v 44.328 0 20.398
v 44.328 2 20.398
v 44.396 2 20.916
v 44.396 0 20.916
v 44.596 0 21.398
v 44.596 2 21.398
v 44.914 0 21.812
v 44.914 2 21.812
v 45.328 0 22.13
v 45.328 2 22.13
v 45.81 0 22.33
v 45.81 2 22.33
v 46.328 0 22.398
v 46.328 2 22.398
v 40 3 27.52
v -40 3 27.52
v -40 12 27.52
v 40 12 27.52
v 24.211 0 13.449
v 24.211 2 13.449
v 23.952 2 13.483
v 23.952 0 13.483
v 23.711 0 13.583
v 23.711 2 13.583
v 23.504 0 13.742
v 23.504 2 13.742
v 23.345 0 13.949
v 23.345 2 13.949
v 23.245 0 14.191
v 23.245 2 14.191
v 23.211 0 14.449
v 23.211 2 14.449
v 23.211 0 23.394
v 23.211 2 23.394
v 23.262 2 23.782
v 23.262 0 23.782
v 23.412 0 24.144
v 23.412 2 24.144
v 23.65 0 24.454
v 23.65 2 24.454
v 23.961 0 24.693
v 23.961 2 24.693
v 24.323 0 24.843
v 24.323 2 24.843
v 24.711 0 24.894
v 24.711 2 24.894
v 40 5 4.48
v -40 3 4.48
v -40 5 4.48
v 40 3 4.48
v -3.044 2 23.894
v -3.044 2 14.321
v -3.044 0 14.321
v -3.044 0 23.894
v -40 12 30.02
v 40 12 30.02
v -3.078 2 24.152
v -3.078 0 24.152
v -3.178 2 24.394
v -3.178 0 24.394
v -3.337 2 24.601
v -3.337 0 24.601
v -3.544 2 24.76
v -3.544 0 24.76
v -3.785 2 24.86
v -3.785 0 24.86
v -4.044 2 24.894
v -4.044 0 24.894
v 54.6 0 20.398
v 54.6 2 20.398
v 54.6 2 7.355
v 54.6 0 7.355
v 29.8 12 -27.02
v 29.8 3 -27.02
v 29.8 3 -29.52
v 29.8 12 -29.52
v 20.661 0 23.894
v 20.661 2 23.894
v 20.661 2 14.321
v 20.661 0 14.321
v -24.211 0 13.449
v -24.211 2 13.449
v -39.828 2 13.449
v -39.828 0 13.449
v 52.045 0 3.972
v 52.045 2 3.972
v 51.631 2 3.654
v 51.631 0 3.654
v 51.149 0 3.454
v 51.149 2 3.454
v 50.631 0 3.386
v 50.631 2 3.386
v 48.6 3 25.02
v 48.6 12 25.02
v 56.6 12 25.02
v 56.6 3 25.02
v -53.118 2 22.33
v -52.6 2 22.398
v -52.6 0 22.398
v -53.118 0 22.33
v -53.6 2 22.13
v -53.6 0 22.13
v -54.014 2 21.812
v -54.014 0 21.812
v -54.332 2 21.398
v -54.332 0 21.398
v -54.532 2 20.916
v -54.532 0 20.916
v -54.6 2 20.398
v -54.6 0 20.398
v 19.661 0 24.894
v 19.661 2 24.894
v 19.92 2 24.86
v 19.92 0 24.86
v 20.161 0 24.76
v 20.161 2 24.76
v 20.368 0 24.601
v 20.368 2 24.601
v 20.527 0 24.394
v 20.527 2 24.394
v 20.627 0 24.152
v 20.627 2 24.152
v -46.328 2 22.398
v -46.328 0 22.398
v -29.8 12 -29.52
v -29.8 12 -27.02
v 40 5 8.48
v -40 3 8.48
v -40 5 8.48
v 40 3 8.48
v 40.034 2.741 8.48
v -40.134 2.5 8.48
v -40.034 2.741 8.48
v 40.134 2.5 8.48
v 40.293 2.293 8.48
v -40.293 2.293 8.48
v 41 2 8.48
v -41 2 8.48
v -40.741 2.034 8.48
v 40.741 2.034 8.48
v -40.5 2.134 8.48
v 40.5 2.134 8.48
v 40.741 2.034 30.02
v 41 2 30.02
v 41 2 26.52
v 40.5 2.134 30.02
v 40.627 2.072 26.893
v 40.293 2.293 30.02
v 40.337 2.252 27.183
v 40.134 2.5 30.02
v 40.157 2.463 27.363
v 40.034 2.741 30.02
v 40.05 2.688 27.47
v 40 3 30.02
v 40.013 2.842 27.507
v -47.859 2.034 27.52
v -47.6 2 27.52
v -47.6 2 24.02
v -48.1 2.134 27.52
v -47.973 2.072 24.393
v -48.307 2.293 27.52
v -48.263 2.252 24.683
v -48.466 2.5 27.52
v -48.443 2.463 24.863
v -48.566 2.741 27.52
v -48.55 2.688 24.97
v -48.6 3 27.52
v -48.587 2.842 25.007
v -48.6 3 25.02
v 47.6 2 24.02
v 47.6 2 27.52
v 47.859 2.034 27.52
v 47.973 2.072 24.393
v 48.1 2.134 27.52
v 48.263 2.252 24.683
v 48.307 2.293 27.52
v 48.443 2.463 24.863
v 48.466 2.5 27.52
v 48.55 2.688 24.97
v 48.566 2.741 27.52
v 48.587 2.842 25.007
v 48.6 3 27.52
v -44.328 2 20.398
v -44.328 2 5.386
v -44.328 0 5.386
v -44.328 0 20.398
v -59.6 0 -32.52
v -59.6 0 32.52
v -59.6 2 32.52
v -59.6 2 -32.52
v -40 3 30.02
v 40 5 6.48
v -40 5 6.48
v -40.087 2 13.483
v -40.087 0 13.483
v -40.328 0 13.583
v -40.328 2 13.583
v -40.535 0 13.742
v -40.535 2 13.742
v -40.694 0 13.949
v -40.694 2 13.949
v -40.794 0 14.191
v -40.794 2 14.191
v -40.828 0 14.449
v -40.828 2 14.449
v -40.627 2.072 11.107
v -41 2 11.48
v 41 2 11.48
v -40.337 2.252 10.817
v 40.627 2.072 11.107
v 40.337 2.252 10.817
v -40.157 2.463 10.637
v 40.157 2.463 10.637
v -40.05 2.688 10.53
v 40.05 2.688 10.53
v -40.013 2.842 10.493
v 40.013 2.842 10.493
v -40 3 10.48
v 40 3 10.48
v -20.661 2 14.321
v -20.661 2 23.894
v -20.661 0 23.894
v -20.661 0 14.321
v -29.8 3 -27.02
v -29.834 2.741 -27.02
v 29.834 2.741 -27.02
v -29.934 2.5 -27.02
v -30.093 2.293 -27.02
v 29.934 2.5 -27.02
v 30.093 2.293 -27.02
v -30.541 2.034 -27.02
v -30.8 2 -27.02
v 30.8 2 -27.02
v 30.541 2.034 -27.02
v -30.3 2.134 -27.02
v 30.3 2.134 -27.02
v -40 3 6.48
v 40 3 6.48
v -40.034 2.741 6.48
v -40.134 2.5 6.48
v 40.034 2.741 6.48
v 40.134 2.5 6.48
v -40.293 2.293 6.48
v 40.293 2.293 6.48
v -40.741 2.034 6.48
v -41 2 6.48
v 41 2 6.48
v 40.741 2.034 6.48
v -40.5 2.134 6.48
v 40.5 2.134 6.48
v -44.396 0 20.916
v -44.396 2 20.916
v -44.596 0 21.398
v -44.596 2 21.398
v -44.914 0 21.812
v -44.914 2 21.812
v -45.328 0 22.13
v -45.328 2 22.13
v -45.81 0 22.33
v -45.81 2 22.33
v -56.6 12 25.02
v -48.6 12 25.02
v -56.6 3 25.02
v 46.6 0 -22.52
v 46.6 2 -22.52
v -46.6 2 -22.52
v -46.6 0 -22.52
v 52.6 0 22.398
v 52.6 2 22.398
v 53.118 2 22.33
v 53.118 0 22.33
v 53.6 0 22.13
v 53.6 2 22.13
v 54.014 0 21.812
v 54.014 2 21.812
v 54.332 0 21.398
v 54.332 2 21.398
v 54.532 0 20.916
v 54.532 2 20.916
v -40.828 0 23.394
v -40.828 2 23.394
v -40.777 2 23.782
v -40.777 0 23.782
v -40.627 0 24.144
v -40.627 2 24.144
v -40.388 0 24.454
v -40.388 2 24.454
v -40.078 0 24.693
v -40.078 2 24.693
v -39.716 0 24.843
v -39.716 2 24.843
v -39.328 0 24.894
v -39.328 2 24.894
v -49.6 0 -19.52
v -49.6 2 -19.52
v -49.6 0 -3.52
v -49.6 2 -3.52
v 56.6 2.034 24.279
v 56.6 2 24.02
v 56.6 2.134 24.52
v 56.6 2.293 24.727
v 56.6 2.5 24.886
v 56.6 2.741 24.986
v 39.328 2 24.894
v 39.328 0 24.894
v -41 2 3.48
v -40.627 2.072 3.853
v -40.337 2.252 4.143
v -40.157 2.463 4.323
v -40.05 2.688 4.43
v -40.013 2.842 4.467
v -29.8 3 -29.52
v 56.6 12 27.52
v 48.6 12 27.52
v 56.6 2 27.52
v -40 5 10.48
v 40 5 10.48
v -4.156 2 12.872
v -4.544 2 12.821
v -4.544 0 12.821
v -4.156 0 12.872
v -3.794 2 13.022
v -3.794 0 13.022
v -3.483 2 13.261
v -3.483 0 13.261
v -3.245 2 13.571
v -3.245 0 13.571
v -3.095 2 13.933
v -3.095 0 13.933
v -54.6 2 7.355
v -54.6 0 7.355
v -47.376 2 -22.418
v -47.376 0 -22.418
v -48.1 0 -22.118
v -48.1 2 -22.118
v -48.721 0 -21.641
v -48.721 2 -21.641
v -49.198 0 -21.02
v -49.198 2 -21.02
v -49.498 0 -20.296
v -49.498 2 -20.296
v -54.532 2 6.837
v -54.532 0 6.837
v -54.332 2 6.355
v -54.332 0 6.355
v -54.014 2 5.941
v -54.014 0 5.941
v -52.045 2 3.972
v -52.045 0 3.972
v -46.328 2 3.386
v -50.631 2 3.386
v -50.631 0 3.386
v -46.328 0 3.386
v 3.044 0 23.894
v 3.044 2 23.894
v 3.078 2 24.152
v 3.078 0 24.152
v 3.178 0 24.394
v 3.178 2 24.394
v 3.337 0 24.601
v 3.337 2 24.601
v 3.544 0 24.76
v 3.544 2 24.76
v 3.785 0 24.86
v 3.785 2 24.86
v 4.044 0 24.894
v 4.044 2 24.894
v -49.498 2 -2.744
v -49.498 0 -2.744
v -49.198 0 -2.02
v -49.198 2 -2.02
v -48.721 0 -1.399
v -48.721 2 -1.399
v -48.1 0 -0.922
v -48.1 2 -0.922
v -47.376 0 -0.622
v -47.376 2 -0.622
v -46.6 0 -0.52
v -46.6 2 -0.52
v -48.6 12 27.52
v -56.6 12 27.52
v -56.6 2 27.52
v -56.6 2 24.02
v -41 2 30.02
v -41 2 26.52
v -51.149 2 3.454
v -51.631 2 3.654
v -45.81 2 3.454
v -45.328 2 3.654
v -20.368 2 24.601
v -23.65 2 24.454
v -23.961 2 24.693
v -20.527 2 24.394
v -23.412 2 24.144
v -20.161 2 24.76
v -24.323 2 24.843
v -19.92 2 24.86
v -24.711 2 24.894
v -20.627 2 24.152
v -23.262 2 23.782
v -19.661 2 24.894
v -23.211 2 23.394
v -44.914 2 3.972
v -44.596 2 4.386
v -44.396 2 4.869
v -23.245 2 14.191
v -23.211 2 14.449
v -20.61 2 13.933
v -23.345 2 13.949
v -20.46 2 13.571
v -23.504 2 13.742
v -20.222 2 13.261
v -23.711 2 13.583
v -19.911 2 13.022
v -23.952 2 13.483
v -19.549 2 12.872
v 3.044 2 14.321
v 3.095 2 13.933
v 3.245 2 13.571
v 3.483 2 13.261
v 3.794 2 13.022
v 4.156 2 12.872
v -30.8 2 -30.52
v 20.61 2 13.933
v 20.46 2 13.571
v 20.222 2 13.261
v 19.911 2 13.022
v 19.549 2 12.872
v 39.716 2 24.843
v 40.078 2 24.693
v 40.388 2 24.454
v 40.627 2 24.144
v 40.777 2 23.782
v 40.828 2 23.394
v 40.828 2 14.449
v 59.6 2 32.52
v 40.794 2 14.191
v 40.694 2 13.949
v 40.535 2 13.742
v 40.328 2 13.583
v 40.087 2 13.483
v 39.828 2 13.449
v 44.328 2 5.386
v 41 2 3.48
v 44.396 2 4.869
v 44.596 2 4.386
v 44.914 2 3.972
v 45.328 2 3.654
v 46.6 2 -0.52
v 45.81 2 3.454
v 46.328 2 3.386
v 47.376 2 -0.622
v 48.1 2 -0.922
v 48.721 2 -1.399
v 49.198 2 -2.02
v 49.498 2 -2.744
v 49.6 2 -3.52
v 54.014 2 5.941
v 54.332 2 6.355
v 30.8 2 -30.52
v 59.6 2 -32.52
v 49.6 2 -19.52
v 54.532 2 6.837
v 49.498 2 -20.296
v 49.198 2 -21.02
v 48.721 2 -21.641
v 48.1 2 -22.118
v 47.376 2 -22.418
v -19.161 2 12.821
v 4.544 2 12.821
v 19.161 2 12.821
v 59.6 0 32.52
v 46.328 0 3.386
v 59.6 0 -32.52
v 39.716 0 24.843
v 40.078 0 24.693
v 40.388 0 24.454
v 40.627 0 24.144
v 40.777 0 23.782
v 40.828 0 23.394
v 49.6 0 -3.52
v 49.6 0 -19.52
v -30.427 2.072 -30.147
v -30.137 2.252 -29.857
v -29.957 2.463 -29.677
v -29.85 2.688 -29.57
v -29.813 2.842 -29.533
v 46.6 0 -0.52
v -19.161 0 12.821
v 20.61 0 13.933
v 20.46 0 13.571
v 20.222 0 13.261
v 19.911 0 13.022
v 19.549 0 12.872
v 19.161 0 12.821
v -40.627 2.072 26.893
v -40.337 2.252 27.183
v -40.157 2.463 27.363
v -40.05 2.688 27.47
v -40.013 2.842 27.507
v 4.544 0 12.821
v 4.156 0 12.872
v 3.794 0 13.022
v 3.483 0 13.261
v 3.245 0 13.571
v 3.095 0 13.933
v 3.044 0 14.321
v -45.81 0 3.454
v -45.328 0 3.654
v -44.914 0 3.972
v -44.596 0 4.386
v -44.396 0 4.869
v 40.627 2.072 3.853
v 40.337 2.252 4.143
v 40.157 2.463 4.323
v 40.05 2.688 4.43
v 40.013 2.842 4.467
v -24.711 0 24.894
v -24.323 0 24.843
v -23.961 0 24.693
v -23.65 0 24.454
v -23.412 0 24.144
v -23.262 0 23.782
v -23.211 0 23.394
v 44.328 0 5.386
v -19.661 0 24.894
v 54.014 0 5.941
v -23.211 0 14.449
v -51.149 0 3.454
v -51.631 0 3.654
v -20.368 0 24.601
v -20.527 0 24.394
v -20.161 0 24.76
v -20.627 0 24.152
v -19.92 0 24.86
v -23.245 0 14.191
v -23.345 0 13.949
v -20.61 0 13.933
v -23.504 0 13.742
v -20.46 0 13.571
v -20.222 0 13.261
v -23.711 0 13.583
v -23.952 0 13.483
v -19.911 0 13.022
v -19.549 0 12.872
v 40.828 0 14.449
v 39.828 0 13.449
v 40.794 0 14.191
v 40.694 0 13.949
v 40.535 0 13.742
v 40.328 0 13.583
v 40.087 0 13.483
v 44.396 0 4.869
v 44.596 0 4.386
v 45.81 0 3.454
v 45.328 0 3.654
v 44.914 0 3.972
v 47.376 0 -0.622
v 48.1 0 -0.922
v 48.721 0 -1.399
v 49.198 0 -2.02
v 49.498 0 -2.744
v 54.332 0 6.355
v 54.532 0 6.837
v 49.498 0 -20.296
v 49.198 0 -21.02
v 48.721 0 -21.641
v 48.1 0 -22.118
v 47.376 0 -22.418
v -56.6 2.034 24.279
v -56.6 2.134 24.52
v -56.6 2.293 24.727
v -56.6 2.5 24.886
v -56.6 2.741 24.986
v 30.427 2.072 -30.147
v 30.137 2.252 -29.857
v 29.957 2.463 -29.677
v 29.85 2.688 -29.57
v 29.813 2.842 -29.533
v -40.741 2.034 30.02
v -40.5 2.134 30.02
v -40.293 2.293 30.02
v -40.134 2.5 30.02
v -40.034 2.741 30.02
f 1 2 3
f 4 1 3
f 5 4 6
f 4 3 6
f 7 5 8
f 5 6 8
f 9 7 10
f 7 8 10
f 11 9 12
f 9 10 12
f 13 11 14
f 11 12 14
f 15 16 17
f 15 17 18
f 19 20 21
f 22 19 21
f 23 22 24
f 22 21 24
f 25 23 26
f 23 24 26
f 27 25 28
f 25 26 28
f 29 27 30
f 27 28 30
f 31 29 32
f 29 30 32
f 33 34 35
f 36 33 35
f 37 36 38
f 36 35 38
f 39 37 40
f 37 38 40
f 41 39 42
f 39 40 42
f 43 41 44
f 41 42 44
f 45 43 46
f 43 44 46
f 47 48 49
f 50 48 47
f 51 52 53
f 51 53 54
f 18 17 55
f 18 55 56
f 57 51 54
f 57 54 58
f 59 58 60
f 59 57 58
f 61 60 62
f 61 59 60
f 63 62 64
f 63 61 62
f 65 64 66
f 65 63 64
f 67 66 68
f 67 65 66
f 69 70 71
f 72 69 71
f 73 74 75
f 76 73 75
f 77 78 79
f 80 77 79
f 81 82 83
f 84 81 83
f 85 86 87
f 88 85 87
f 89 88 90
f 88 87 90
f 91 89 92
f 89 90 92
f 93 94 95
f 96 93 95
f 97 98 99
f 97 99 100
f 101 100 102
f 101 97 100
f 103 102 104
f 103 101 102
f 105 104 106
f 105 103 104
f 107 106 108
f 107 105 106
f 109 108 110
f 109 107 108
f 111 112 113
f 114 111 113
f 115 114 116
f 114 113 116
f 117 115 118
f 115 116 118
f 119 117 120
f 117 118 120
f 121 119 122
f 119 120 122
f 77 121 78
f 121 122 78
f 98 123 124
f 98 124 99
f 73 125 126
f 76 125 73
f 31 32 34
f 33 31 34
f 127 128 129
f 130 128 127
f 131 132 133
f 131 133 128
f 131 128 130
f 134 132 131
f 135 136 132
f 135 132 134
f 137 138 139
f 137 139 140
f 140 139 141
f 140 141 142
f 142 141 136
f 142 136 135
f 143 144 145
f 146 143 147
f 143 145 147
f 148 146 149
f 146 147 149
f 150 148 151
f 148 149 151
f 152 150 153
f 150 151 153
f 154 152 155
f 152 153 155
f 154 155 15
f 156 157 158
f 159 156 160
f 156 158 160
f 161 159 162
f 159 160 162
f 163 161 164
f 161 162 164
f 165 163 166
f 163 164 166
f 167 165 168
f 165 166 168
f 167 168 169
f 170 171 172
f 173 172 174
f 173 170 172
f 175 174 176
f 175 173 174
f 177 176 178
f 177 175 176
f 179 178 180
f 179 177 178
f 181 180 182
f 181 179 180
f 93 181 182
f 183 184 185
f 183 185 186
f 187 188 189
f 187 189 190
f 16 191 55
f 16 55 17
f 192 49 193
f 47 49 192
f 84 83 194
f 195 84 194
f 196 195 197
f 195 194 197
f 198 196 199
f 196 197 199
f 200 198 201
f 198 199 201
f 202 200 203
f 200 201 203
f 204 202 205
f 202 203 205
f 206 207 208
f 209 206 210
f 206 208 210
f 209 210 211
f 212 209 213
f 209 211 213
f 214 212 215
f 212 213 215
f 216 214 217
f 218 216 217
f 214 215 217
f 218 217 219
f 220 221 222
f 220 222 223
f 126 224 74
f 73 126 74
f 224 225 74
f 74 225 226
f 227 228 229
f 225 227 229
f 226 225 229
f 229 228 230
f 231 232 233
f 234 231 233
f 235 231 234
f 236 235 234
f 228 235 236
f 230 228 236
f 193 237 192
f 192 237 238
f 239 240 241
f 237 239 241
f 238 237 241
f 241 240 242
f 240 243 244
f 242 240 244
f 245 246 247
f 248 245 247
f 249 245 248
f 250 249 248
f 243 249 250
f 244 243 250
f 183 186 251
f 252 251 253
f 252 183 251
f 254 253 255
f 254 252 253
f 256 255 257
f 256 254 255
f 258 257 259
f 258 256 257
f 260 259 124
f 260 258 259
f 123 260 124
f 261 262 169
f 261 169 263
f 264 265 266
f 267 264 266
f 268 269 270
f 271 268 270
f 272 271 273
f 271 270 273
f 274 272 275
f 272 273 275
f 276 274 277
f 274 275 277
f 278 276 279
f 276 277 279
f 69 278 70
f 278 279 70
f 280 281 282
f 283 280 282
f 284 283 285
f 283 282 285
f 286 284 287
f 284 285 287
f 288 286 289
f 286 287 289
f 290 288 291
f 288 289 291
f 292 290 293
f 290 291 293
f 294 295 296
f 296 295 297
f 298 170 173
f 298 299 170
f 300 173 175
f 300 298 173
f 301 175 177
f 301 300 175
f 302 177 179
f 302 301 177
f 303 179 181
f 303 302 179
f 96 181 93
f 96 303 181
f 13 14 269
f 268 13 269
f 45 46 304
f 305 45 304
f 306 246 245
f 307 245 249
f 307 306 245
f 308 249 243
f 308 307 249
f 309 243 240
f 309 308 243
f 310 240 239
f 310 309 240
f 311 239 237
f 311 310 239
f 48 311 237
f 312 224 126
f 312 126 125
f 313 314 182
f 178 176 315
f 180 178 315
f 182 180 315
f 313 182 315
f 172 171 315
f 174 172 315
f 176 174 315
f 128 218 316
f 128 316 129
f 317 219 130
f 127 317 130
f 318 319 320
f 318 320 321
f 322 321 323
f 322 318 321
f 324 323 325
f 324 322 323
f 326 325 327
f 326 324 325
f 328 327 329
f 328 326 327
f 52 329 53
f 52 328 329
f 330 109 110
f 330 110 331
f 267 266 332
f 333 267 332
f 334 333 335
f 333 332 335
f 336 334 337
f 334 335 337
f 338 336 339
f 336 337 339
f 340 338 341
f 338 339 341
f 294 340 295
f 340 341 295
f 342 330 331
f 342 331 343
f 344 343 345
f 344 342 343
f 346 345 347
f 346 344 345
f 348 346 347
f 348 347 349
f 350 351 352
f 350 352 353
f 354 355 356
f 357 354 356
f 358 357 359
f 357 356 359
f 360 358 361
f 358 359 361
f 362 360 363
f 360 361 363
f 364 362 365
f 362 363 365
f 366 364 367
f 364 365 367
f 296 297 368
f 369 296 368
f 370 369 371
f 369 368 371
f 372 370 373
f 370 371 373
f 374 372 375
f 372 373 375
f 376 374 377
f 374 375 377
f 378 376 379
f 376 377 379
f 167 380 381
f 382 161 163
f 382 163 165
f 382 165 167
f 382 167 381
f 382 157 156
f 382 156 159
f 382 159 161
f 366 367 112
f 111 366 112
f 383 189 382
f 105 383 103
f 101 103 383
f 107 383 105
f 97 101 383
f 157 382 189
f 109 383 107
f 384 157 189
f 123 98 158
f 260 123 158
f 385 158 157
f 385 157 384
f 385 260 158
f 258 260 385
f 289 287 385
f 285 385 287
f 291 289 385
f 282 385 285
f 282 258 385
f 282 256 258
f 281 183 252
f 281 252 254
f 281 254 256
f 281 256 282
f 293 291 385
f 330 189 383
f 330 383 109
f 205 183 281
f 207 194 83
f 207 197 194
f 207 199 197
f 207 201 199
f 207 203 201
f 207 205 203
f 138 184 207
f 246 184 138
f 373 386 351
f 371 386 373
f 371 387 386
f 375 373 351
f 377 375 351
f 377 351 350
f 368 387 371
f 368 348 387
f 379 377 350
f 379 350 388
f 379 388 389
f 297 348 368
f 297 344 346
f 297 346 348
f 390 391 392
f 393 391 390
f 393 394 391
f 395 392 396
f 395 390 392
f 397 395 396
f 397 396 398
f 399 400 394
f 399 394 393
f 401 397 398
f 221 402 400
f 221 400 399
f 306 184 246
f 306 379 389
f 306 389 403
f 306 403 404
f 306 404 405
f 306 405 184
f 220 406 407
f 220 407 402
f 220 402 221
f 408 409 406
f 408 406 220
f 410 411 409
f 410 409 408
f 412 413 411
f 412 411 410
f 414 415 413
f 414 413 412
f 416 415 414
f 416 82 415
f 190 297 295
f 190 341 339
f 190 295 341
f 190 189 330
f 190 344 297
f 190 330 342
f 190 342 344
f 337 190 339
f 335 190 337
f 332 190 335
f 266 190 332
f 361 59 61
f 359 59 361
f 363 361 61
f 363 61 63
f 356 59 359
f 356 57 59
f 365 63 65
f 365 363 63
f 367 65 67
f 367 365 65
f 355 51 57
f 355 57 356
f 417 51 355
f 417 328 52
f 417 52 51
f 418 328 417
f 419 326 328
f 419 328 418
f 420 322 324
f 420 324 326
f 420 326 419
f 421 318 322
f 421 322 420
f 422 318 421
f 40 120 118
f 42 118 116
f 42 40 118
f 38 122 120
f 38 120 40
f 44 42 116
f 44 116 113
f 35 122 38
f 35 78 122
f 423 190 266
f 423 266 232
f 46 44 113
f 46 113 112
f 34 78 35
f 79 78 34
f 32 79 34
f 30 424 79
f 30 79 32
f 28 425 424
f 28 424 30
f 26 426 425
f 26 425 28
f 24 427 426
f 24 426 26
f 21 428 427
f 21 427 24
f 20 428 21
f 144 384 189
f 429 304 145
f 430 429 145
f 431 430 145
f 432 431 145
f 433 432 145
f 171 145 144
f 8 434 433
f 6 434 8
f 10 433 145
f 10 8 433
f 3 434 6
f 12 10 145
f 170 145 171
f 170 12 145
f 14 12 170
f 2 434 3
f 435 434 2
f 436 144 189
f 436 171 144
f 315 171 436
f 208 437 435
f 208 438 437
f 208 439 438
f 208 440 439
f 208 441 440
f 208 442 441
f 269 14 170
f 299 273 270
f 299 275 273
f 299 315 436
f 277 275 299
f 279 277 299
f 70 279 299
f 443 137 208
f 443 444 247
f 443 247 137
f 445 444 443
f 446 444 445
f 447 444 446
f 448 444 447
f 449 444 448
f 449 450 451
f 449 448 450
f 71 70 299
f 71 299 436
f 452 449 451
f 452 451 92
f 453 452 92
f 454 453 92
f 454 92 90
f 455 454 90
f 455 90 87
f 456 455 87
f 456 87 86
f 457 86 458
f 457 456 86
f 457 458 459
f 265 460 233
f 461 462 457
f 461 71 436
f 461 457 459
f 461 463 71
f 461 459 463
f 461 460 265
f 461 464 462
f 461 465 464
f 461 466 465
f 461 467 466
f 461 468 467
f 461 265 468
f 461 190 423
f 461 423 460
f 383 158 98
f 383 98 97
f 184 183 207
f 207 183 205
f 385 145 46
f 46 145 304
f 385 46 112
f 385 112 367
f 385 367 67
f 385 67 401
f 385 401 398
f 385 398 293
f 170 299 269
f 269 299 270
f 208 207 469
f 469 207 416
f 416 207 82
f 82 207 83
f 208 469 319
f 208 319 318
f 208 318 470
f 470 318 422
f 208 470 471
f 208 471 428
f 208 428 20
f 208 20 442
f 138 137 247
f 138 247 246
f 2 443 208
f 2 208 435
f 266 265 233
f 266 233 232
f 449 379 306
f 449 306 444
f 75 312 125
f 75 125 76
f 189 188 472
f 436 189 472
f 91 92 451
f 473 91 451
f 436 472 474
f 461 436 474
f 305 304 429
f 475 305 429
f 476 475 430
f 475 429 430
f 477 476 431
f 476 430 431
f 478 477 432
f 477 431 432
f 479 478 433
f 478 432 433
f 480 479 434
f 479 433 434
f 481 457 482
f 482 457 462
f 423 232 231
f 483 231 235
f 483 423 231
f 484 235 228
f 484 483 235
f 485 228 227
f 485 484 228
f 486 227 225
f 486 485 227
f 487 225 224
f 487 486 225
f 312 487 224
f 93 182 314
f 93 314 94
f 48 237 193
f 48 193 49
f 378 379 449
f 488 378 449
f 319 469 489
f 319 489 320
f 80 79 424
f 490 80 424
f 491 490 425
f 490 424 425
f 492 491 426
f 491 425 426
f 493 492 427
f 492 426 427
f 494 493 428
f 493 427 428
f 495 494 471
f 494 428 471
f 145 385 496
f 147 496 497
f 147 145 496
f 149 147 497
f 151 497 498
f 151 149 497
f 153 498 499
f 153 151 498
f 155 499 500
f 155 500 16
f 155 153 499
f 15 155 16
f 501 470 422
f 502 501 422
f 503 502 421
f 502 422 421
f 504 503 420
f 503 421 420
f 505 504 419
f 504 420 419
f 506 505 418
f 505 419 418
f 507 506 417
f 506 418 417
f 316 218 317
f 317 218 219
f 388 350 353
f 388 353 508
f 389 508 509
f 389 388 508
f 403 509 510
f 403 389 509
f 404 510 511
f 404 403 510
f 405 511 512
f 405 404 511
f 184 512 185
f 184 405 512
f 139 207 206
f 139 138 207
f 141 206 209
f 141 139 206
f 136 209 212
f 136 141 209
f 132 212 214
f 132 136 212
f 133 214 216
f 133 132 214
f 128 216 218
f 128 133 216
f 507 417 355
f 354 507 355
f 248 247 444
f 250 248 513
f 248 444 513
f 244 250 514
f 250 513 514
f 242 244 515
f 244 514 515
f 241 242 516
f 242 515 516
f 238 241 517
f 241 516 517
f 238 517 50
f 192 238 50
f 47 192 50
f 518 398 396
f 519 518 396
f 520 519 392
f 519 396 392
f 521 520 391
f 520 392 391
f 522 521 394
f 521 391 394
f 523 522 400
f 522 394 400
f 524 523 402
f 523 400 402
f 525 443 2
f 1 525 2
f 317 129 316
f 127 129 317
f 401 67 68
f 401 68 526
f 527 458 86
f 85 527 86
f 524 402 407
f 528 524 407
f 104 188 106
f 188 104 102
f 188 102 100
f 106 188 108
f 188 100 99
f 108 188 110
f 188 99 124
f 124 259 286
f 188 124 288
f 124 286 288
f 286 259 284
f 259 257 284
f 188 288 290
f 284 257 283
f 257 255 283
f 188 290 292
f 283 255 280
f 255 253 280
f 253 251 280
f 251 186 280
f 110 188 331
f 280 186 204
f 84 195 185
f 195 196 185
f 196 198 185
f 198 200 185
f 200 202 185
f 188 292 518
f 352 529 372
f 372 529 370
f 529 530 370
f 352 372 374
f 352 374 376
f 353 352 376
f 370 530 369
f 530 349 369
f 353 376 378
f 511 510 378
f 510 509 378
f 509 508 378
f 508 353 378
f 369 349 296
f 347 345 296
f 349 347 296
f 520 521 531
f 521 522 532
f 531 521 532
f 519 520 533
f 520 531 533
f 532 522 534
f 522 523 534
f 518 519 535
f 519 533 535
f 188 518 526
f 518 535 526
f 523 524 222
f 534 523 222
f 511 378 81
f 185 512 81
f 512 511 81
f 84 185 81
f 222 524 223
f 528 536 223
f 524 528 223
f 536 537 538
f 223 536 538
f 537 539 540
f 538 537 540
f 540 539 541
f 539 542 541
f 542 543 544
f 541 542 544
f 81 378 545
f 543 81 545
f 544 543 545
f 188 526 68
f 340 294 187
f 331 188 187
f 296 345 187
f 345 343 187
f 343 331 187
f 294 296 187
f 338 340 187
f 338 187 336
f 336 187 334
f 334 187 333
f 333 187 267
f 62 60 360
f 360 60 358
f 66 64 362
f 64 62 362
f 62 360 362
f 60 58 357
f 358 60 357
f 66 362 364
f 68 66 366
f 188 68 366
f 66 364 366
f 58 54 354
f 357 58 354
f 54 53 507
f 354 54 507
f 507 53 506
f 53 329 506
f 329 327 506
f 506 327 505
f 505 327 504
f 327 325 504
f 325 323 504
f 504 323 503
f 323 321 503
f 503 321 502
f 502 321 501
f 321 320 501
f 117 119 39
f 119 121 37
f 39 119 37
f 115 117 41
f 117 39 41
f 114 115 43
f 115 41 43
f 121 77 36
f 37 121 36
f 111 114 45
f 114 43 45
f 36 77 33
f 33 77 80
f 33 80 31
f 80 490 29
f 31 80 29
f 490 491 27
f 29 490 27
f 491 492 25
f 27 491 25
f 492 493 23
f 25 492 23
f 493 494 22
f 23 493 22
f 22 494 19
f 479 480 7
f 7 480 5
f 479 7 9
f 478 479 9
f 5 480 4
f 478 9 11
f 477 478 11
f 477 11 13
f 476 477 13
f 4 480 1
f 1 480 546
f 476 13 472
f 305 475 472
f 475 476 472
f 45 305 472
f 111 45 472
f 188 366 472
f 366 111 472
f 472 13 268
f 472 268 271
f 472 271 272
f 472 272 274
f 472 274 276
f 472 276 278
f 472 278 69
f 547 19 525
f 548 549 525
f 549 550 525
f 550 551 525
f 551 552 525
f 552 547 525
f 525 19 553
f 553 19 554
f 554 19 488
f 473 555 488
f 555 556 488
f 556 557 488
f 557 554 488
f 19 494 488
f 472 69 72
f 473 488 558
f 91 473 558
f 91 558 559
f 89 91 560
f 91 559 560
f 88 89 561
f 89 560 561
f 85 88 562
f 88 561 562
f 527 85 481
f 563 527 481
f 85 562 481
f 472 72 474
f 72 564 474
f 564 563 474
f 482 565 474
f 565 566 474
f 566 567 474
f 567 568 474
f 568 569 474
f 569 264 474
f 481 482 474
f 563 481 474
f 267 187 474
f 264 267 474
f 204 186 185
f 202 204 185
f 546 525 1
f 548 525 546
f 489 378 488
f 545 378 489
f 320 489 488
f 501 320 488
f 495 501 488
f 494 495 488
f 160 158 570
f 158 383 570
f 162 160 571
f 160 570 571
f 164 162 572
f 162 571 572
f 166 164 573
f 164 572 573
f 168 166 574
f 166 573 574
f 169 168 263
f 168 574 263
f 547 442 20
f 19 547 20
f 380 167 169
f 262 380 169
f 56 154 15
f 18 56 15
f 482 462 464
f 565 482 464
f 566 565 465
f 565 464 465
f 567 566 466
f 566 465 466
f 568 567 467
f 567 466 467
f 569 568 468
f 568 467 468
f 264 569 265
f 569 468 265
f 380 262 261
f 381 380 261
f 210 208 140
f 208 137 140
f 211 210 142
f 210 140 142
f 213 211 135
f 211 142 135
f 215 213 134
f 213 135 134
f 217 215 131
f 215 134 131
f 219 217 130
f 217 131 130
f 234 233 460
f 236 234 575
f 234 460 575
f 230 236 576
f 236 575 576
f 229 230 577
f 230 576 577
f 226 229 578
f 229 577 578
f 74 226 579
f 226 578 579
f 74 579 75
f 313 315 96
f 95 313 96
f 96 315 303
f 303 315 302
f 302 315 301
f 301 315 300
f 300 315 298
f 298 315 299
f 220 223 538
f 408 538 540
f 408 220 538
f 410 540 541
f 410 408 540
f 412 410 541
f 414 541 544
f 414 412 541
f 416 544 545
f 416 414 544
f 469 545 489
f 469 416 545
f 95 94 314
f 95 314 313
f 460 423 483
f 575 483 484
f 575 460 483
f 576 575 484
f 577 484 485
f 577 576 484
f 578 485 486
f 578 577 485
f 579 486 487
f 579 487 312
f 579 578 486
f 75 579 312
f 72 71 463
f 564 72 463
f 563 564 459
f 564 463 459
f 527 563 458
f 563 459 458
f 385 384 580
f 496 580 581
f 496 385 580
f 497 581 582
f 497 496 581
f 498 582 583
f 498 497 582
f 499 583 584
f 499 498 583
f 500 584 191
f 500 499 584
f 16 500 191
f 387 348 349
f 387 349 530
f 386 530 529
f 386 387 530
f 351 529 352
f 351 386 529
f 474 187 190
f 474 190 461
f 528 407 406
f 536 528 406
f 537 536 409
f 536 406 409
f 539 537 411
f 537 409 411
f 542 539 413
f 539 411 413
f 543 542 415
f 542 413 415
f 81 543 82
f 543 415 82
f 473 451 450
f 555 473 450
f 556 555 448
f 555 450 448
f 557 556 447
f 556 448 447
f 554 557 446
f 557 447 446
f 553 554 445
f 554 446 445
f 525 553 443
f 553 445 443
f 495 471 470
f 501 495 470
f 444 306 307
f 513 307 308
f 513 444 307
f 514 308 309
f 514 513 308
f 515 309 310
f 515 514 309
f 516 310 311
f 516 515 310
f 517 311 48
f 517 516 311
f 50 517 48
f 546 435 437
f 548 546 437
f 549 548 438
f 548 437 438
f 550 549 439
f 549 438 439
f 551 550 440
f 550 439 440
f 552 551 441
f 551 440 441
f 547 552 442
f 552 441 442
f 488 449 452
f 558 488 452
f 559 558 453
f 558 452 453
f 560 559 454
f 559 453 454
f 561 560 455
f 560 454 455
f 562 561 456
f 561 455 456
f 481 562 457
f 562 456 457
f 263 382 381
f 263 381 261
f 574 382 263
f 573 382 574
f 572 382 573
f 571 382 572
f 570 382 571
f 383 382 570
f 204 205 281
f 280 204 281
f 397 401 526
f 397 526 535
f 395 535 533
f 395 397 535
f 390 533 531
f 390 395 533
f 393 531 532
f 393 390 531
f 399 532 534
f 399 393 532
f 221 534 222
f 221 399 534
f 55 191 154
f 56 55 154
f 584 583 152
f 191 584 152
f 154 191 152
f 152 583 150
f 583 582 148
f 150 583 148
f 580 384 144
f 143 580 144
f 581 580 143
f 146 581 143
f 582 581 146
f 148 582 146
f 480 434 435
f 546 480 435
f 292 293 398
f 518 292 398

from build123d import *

# Parameters (mm, degrees)
SKETCH1_W           = 119.2
SKETCH1_H           = 65.04
BOSS_EXTRUDE1_DEPTH = 2
SKETCH2_W           = 80
SKETCH2_H           = 2
SKETCH2_W_2         = 59.6
SKETCH2_H_2         = 2.5
BOSS_EXTRUDE2_DEPTH = 10
FILLET1_R           = 1
SKETCH3_W           = 80
SKETCH3_H           = 2
CUT_EXTRUDE1_DEPTH  = 7
SKETCH4_W           = 80
SKETCH4_H           = 2.5
SKETCH4_W_2         = 8
BOSS_EXTRUDE3_DEPTH = 10
FILLET2_R           = 1
FILLET3_R           = 1
CUT_EXTRUDE2_DEPTH  = 10
CUT_EXTRUDE3_DEPTH  = 10


with BuildPart() as part:
    # Sketch1 → Boss-Extrude1 (new body)
    with BuildSketch(Plane(origin=(0, 0, 0), x_dir=(1, 0, 0), z_dir=(0, 1, 0))):
        Rectangle(SKETCH1_W, SKETCH1_H)
    extrude(amount=BOSS_EXTRUDE1_DEPTH)

    # Sketch2 → Boss-Extrude2 (add)
    with BuildSketch(Plane(origin=(0, 2, 0), x_dir=(1, 0, 0), z_dir=(0, 1, 0))):
        with Locations((0, -9.48)):
            Rectangle(SKETCH2_W, SKETCH2_H)
        with Locations((0, -5.48)):
            Rectangle(SKETCH2_W, SKETCH2_H)
        with Locations((0, 28.27)):
            Rectangle(SKETCH2_W_2, SKETCH2_H_2)
    extrude(amount=BOSS_EXTRUDE2_DEPTH)

    # Fillet1
    fillet1_edges = [part.edges().sort_by_distance(p)[0] for p in [
        (40, 2, 9.48),
        (0, 2, 10.48),
        (-40, 2, 9.48),
        (40, 2, 5.48),
        (0, 2, 4.48),
        (-40, 2, 5.48),
        (-29.8, 2, -28.27),
        (29.8, 2, -28.27),
        (0, 2, -29.52),
    ]]
    fillet(fillet1_edges, radius=FILLET1_R)

    # Sketch3 → Cut-Extrude1 (cut)
    with BuildSketch(Plane(origin=(0, 12, 0), x_dir=(1, 0, 0), z_dir=(0, 1, 0))):
        with Locations((0, -5.48)):
            Rectangle(SKETCH3_W, SKETCH3_H)
        with Locations((0, -9.48)):
            Rectangle(SKETCH3_W, SKETCH3_H)
    extrude(amount=-CUT_EXTRUDE1_DEPTH, mode=Mode.SUBTRACT)

    # Sketch4 → Boss-Extrude3 (add)
    with BuildSketch(Plane(origin=(0, 2, 0), x_dir=(1, 0, 0), z_dir=(0, 1, 0))):
        with Locations((0, -28.77)):
            Rectangle(SKETCH4_W, SKETCH4_H)
        with Locations((52.6, -26.27)):
            Rectangle(SKETCH4_W_2, SKETCH4_H)
    boss_extrude3 = extrude(amount=BOSS_EXTRUDE3_DEPTH)

    # Fillet2
    fillet2_edges = [part.edges().sort_by_distance(p)[0] for p in [
        (-40, 2, 28.77),
        (48.6, 2, 26.27),
        (52.6, 2, 25.02),
        (40, 2, 28.77),
        (0, 2, 27.52),
    ]]
    fillet(fillet2_edges, radius=FILLET2_R)

    # Mirror1: Boss-Extrude3 across plane
    add(boss_extrude3.mirror(Plane.ZY))

    # Fillet3
    fillet3_edges = [part.edges().sort_by_distance(p)[0] for p in [
        (-48.6, 2, 26.27),
        (-52.6, 2, 25.02),
    ]]
    fillet(fillet3_edges, radius=FILLET3_R)

    # Sketch5 → Cut-Extrude2 (cut)
    with BuildSketch(Plane(origin=(0, 2, 0), x_dir=(1, 0, 0), z_dir=(0, 1, 0))):
        with BuildLine():
            Line((46.6, 22.52), (6.311514948, 22.52))
            Line((6.311514948, 22.52), (-46.6, 22.52))
            ThreePointArc((-46.6, 22.52), (-48.721320344, 21.641320344), (-49.6, 19.52))
            Line((-49.6, 19.52), (-49.6, 3.52))
            ThreePointArc((-49.6, 3.52), (-48.721320344, 1.398679656), (-46.6, 0.52))
            Line((-46.6, 0.52), (46.6, 0.52))
            ThreePointArc((46.6, 0.52), (48.721320344, 1.398679656), (49.6, 3.52))
            Line((49.6, 3.52), (49.6, 19.52))
            ThreePointArc((49.6, 19.52), (48.721320344, 21.641320344), (46.6, 22.52))
        make_face()
    extrude(amount=-CUT_EXTRUDE2_DEPTH, mode=Mode.SUBTRACT)

    # Sketch6 → Cut-Extrude3 (cut)
    with BuildSketch(Plane(origin=(0, 2, 0), x_dir=(1, 0, 0), z_dir=(0, 1, 0))):
        with BuildLine():
            Line((54.014213562, -5.94084617), (52.045315698, -3.971948306))
            ThreePointArc((52.045315698, -3.971948306), (51.396469, -3.538402803), (50.631102135, -3.386161868))
            Line((50.631102135, -3.386161868), (46.32782558, -3.386161868))
            ThreePointArc((46.32782558, -3.386161868), (44.913612017, -3.971948306), (44.32782558, -5.386161868))
            Line((44.32782558, -5.386161868), (44.32782558, -20.397912268))
            ThreePointArc((44.32782558, -20.397912268), (44.913612017, -21.812125831), (46.32782558, -22.397912268))
            Line((46.32782558, -22.397912268), (52.6, -22.397912268))
            ThreePointArc((52.6, -22.397912268), (54.014213562, -21.812125831), (54.6, -20.397912268))
            Line((54.6, -20.397912268), (54.6, -7.355059733))
            ThreePointArc((54.6, -7.355059733), (54.447759065, -6.589692868), (54.014213562, -5.94084617))
        make_face()
        with BuildLine():
            Line((39.82782558, -13.44932419), (24.210760832, -13.44932419))
            ThreePointArc((24.210760832, -13.44932419), (23.503654051, -13.742217409), (23.210760832, -14.44932419))
            Line((23.210760832, -14.44932419), (23.210760832, -23.393622011))
            ThreePointArc((23.210760832, -23.393622011), (23.650100661, -24.454282183), (24.710760832, -24.893622011))
            Line((24.710760832, -24.893622011), (39.32782558, -24.893622011))
            ThreePointArc((39.32782558, -24.893622011), (40.388485752, -24.454282183), (40.82782558, -23.393622011))
            Line((40.82782558, -23.393622011), (40.82782558, -14.44932419))
            ThreePointArc((40.82782558, -14.44932419), (40.534932361, -13.742217409), (39.82782558, -13.44932419))
        make_face()
        with BuildLine():
            Line((4.043952302, -24.893622011), (19.660852384, -24.893622011))
            ThreePointArc((19.660852384, -24.893622011), (20.367959165, -24.600728792), (20.660852384, -23.893622011))
            Line((20.660852384, -23.893622011), (20.660852384, -14.321364431))
            ThreePointArc((20.660852384, -14.321364431), (20.221512556, -13.260704259), (19.160852384, -12.821364431))
            Line((19.160852384, -12.821364431), (4.543952302, -12.821364431))
            ThreePointArc((4.543952302, -12.821364431), (3.48329213, -13.260704259), (3.043952302, -14.321364431))
            Line((3.043952302, -14.321364431), (3.043952302, -23.893622011))
            ThreePointArc((3.043952302, -23.893622011), (3.336845521, -24.600728792), (4.043952302, -24.893622011))
        make_face()
        with BuildLine():
            Line((-4.043952302, -24.893622011), (-19.660852384, -24.893622011))
            ThreePointArc((-19.660852384, -24.893622011), (-20.367959165, -24.600728792), (-20.660852384, -23.893622011))
            Line((-20.660852384, -23.893622011), (-20.660852384, -14.321364431))
            ThreePointArc((-20.660852384, -14.321364431), (-20.221512556, -13.260704259), (-19.160852384, -12.821364431))
            Line((-19.160852384, -12.821364431), (-4.543952302, -12.821364431))
            ThreePointArc((-4.543952302, -12.821364431), (-3.48329213, -13.260704259), (-3.043952302, -14.321364431))
            Line((-3.043952302, -14.321364431), (-3.043952302, -23.893622011))
            ThreePointArc((-3.043952302, -23.893622011), (-3.336845521, -24.600728792), (-4.043952302, -24.893622011))
        make_face()
        with BuildLine():
            Line((-39.32782558, -24.893622011), (-24.710760832, -24.893622011))
            ThreePointArc((-24.710760832, -24.893622011), (-23.650100661, -24.454282183), (-23.210760832, -23.393622011))
            Line((-23.210760832, -23.393622011), (-23.210760832, -14.44932419))
            ThreePointArc((-23.210760832, -14.44932419), (-23.503654051, -13.742217409), (-24.210760832, -13.44932419))
            Line((-24.210760832, -13.44932419), (-39.82782558, -13.44932419))
            ThreePointArc((-39.82782558, -13.44932419), (-40.534932361, -13.742217409), (-40.82782558, -14.44932419))
            Line((-40.82782558, -14.44932419), (-40.82782558, -23.393622011))
            ThreePointArc((-40.82782558, -23.393622011), (-40.388485752, -24.454282183), (-39.32782558, -24.893622011))
        make_face()
        with BuildLine():
            Line((-44.32782558, -5.386161868), (-44.32782558, -20.397912268))
            ThreePointArc((-44.32782558, -20.397912268), (-44.913612017, -21.812125831), (-46.32782558, -22.397912268))
            Line((-46.32782558, -22.397912268), (-52.6, -22.397912268))
            ThreePointArc((-52.6, -22.397912268), (-54.014213562, -21.812125831), (-54.6, -20.397912268))
            Line((-54.6, -20.397912268), (-54.6, -7.355059733))
            ThreePointArc((-54.6, -7.355059733), (-54.447759065, -6.589692868), (-54.014213562, -5.94084617))
            Line((-54.014213562, -5.94084617), (-52.045315698, -3.971948306))
            ThreePointArc((-52.045315698, -3.971948306), (-51.396469, -3.538402803), (-50.631102135, -3.386161868))
            Line((-50.631102135, -3.386161868), (-46.32782558, -3.386161868))
            ThreePointArc((-46.32782558, -3.386161868), (-44.913612017, -3.971948306), (-44.32782558, -5.386161868))
        make_face()
    extrude(amount=-CUT_EXTRUDE3_DEPTH, mode=Mode.SUBTRACT)


solid = part.part
